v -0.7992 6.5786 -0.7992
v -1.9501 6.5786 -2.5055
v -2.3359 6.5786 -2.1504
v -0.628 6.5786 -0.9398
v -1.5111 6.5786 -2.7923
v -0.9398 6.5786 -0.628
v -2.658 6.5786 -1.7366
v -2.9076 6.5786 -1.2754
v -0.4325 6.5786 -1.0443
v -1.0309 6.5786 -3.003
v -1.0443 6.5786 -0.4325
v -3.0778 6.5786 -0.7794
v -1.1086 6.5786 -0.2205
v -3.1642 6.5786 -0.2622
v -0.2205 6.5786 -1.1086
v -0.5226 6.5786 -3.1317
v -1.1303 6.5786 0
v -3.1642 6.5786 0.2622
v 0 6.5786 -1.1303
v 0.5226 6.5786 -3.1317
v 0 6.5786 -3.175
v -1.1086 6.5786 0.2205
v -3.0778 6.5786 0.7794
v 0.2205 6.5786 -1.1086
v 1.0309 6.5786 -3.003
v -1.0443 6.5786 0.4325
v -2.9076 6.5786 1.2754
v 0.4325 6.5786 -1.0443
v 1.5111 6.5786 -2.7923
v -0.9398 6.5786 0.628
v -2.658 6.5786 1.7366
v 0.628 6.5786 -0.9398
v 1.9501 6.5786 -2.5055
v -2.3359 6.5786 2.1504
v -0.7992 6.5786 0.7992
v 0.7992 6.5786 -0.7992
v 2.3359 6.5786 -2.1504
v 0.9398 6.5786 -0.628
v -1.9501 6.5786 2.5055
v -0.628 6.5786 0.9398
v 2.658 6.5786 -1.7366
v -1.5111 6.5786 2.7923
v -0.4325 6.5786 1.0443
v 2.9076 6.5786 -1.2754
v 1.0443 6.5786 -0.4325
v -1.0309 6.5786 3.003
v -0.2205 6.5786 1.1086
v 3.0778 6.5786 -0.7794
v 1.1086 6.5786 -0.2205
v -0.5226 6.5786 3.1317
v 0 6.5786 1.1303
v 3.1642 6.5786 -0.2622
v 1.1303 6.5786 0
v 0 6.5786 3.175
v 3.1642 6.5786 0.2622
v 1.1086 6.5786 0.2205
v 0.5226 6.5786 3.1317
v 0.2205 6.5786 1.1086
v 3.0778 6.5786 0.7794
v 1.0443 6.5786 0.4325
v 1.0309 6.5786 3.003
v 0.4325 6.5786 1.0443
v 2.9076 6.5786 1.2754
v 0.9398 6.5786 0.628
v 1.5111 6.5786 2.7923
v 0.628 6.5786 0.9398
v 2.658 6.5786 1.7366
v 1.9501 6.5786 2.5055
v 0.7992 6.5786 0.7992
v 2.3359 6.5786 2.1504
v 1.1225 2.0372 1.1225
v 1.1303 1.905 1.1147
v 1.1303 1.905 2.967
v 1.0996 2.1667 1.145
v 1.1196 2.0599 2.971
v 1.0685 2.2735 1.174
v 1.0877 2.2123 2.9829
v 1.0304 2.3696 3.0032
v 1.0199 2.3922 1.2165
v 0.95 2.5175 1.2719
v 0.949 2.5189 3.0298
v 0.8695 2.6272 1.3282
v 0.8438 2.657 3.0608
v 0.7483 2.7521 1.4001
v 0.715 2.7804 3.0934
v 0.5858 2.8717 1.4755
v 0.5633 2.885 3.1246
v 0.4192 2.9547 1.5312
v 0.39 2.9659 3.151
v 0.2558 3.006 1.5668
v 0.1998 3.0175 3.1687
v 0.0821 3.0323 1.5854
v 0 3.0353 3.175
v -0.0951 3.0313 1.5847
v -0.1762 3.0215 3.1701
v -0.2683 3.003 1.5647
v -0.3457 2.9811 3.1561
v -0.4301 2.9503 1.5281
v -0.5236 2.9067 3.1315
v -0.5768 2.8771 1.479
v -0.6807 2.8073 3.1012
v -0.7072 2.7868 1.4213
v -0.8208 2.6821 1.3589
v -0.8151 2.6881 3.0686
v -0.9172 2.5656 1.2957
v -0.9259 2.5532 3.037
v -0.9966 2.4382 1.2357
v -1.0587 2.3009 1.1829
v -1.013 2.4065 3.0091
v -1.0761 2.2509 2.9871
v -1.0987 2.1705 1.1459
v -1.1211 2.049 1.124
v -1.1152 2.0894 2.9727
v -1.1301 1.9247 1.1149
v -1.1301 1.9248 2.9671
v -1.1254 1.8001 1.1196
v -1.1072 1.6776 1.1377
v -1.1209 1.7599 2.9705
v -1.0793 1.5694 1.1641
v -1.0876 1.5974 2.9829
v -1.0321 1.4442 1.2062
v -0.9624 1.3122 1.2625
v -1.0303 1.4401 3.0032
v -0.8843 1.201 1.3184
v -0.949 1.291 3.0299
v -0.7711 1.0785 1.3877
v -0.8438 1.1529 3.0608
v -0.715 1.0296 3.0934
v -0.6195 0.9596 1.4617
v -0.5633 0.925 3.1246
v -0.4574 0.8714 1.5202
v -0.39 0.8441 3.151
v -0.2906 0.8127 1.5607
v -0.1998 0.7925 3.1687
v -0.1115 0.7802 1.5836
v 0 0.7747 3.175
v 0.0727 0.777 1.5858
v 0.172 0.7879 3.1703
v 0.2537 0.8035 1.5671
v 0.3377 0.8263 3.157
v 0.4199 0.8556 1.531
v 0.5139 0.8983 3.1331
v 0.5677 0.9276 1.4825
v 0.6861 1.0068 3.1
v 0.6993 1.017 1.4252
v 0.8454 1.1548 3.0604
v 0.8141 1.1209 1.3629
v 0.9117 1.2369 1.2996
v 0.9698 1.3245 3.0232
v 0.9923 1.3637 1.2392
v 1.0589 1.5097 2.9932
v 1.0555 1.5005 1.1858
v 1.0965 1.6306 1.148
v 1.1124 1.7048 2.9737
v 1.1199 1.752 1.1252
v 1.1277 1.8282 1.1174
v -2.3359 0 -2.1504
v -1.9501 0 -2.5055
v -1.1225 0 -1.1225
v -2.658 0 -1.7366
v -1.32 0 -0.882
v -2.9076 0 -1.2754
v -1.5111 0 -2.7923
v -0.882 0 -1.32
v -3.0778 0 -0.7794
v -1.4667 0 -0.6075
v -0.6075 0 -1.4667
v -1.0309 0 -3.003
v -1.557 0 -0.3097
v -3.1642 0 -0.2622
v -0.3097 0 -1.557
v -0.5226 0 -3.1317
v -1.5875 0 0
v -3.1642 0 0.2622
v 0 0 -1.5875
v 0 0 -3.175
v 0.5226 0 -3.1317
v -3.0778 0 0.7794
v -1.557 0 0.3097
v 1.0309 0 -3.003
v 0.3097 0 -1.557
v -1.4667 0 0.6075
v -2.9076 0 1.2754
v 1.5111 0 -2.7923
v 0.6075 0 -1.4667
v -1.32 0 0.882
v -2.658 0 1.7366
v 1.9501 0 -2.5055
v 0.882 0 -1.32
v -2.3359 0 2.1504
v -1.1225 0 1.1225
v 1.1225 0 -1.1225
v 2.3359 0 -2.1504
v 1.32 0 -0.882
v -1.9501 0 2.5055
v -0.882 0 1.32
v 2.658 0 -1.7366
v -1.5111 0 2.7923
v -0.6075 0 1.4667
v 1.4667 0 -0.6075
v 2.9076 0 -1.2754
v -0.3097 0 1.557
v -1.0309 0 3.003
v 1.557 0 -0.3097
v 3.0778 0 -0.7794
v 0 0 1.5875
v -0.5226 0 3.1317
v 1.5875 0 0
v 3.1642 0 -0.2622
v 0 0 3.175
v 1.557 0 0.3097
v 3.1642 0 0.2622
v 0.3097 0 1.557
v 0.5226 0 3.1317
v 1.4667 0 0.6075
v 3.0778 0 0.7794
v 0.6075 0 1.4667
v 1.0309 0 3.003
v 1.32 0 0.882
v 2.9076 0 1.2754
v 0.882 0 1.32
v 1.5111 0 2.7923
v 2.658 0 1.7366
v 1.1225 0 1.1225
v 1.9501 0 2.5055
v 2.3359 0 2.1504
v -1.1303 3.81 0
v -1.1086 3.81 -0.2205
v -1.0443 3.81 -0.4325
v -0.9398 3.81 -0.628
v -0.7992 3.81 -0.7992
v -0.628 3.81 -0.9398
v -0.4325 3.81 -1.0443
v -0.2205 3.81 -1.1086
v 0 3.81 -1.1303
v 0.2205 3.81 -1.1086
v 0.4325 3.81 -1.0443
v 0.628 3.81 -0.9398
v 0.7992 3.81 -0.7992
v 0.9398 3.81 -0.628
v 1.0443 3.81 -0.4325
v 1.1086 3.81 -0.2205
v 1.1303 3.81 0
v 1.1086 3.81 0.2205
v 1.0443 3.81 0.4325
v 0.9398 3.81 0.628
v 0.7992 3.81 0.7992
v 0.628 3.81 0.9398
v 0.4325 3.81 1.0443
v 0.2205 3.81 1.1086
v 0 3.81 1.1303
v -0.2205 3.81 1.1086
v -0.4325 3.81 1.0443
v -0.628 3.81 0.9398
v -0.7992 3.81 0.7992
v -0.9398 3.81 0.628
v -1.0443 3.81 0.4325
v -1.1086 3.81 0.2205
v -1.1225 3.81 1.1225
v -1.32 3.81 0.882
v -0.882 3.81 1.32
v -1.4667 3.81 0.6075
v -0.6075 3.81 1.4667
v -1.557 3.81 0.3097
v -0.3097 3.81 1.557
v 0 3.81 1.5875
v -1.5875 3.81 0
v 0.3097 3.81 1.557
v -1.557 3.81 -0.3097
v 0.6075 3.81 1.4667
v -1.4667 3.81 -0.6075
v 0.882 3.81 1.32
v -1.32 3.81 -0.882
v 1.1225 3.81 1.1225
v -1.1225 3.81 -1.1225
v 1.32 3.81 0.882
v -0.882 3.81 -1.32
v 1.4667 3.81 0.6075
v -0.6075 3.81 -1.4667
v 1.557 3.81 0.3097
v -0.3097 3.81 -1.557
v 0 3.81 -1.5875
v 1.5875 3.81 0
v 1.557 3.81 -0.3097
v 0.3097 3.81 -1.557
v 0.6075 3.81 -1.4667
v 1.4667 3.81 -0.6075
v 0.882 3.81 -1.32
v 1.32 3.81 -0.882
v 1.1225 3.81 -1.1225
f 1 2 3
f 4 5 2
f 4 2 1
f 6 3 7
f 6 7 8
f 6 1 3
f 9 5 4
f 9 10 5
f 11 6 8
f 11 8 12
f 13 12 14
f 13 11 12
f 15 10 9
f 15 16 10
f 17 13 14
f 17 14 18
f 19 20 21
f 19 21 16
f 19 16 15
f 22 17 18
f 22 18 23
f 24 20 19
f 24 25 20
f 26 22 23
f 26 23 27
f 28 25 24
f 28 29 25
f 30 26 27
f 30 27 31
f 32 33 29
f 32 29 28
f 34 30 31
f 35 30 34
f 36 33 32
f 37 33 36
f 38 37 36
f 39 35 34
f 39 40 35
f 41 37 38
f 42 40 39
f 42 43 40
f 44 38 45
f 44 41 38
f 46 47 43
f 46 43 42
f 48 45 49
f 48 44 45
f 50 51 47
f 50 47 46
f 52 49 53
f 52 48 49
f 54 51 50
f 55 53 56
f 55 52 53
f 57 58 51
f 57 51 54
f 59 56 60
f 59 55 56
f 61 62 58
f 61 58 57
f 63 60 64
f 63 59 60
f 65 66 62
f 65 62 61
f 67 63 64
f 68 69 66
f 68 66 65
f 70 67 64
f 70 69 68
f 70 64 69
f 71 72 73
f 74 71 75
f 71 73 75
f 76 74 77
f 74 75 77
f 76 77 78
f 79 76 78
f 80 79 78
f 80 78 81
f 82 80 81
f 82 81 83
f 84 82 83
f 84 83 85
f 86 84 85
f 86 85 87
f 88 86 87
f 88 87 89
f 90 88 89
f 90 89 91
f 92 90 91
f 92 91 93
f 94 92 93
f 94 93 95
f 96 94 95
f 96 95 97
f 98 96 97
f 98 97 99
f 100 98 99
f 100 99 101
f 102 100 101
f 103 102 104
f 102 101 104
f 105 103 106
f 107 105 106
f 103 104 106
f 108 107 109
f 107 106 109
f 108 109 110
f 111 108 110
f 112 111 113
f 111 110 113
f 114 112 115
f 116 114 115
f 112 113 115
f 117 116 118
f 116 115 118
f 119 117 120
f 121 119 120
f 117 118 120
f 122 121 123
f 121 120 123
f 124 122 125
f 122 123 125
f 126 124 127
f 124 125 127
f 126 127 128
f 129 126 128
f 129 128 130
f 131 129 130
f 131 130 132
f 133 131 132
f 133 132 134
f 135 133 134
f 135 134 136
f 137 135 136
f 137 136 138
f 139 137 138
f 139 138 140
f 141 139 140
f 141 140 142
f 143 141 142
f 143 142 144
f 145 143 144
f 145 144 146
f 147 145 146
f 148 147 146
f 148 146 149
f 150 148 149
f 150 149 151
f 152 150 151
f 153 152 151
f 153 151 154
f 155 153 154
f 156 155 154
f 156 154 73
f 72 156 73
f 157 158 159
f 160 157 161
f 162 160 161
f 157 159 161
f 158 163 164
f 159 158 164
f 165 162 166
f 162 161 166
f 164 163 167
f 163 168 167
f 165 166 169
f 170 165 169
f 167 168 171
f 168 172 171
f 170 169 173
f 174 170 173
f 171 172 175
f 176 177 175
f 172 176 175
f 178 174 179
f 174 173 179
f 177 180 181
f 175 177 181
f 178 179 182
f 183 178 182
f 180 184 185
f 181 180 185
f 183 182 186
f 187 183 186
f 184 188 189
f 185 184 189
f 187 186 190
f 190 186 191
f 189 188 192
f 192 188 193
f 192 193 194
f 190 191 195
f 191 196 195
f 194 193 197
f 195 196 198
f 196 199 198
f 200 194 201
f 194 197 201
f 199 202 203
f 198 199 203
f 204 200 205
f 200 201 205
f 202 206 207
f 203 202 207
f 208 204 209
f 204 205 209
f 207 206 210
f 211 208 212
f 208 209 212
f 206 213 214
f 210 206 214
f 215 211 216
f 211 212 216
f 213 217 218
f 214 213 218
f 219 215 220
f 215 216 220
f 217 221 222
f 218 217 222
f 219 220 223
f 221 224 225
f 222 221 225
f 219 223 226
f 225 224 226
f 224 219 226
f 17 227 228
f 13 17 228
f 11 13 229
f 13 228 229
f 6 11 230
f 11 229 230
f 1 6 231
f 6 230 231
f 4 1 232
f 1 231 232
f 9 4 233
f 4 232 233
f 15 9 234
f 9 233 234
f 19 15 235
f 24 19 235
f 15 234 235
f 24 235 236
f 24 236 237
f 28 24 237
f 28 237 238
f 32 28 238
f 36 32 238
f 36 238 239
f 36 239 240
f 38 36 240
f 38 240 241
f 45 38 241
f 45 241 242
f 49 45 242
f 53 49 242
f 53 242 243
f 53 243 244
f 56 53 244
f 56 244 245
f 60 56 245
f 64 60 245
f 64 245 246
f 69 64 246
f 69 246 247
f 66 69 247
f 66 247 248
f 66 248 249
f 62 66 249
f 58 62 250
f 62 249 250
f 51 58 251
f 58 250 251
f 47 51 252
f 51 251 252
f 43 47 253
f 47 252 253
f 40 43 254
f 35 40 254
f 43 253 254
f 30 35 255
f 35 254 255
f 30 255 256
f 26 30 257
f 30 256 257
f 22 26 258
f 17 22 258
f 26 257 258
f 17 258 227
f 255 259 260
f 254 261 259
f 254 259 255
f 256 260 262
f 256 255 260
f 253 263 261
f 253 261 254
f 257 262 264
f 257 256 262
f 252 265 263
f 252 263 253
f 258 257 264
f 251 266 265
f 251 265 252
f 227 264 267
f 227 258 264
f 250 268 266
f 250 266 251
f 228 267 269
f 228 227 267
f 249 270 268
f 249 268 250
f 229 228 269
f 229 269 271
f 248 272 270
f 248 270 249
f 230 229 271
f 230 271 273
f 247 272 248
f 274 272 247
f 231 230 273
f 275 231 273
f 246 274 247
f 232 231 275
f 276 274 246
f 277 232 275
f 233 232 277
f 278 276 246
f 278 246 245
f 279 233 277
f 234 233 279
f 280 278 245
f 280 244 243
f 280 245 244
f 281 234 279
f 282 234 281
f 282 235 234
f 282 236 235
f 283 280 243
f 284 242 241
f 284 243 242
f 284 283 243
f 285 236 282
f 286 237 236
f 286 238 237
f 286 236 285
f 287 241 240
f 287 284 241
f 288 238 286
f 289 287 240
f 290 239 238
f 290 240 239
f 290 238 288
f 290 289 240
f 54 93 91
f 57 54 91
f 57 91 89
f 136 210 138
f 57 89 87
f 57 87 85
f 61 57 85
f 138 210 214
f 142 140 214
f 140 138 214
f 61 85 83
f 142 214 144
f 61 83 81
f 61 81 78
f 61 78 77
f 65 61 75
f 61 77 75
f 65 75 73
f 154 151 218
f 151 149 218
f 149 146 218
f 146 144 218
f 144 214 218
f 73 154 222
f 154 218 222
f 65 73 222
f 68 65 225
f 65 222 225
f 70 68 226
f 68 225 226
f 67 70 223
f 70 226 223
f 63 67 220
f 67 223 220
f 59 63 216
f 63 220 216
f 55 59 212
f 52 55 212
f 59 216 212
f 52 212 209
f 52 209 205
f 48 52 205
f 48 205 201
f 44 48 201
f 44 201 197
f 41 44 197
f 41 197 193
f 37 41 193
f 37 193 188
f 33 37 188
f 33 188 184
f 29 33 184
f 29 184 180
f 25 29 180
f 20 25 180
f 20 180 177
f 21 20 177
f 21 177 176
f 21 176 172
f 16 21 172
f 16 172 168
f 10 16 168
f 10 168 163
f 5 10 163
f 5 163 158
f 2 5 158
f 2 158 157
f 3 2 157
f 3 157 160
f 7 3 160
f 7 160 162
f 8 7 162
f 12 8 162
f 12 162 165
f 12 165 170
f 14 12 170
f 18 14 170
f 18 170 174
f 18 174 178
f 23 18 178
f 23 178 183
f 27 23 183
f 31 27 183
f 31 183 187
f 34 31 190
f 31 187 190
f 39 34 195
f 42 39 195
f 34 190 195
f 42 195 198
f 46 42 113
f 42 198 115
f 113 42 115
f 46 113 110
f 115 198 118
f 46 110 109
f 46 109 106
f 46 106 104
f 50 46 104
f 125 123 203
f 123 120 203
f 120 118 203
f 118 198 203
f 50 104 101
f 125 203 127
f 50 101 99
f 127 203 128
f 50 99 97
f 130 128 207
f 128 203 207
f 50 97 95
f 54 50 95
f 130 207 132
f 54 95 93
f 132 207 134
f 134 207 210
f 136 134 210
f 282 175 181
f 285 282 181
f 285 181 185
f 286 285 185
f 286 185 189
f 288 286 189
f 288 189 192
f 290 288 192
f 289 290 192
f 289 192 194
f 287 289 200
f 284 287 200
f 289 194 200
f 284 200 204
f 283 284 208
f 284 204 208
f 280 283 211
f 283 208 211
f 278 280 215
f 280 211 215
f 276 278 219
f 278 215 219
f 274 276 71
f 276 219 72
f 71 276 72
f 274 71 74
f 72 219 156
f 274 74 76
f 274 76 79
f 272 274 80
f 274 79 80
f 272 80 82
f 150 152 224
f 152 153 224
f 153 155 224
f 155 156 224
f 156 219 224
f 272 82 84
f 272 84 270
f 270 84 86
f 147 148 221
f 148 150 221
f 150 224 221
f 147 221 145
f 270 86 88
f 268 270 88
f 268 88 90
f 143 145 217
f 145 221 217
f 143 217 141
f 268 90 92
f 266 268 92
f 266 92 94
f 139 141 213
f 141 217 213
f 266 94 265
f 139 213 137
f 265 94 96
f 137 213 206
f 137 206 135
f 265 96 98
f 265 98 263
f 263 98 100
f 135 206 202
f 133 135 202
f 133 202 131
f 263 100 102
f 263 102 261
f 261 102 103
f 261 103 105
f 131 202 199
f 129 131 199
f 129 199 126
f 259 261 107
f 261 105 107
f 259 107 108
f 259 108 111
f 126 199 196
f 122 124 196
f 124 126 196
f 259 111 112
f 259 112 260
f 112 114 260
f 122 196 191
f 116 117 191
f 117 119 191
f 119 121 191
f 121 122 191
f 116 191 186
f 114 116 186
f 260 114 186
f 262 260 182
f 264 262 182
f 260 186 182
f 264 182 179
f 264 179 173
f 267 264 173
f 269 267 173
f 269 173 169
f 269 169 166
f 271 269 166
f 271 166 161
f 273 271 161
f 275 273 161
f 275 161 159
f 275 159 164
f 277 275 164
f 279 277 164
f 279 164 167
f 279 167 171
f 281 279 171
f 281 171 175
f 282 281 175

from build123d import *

# Parameters (mm, degrees)
SKETCH1_R                  = 3.175
BOSS_EXTRUDE1_DEPTH        = 6.5786
SKETCH2_R                  = 1.5875
CUT_EXTRUDE1_DEPTH         = 3.81
F_4_40_TAPPED_HOLE1_D      = 2.2606
F_4_40_TAPPED_HOLE1_DEPTH  = 12.7
F_4_40_TAPPED_HOLE1_TIP    = 0.679152758
F_4_40_TAPPED_HOLE2_REACH  = 11.679
F_4_40_TAPPED_HOLE2_BORE_R = 1.1303


with BuildPart() as part:
    # Sketch1 → Boss-Extrude1 (new body)
    with BuildSketch(Plane(origin=(0, 0, 0), x_dir=(1, 0, 0), z_dir=(0, 1, 0))):
        with Locations(Location((0, 0, 0), (0, 0, 270))):
            Circle(SKETCH1_R)
    extrude(amount=BOSS_EXTRUDE1_DEPTH)

    # Sketch2 → Cut-Extrude1 (cut)
    with BuildSketch(Plane.XZ):
        with Locations(Location((0, 0, 0), (0, 0, 270))):
            Circle(SKETCH2_R)
    extrude(amount=-CUT_EXTRUDE1_DEPTH, mode=Mode.SUBTRACT)

    # #4-40 Tapped Hole1
    with Locations(Plane(origin=(0, 6.5786, 0), x_dir=(1, 0, 0), z_dir=(0, 1, 0))):
        with Locations((0, 0)):
            Hole(F_4_40_TAPPED_HOLE1_D / 2, depth=F_4_40_TAPPED_HOLE1_DEPTH)
            with Locations((0, 0, -(F_4_40_TAPPED_HOLE1_DEPTH + F_4_40_TAPPED_HOLE1_TIP / 2))):  # 118° drill point
                Cone(0, F_4_40_TAPPED_HOLE1_D / 2, F_4_40_TAPPED_HOLE1_TIP, mode=Mode.SUBTRACT)

    # #4-40 Tapped Hole2 bore → #4-40 Tapped Hole2 (cut, up to next)
    with BuildSketch(Plane.XY.offset(3.175), mode=Mode.PRIVATE) as f_4_40_tapped_hole2_sk1:
        with Locations((0, 1.905)):
            Circle(F_4_40_TAPPED_HOLE2_BORE_R)
    f_4_40_tapped_hole2_tool1 = extrude(f_4_40_tapped_hole2_sk1.sketch, amount=-F_4_40_TAPPED_HOLE2_REACH, mode=Mode.PRIVATE) & part.part
    add(f_4_40_tapped_hole2_tool1.solids().sort_by_distance((0, 1.905, 3.175))[0], mode=Mode.SUBTRACT)


solid = part.part
